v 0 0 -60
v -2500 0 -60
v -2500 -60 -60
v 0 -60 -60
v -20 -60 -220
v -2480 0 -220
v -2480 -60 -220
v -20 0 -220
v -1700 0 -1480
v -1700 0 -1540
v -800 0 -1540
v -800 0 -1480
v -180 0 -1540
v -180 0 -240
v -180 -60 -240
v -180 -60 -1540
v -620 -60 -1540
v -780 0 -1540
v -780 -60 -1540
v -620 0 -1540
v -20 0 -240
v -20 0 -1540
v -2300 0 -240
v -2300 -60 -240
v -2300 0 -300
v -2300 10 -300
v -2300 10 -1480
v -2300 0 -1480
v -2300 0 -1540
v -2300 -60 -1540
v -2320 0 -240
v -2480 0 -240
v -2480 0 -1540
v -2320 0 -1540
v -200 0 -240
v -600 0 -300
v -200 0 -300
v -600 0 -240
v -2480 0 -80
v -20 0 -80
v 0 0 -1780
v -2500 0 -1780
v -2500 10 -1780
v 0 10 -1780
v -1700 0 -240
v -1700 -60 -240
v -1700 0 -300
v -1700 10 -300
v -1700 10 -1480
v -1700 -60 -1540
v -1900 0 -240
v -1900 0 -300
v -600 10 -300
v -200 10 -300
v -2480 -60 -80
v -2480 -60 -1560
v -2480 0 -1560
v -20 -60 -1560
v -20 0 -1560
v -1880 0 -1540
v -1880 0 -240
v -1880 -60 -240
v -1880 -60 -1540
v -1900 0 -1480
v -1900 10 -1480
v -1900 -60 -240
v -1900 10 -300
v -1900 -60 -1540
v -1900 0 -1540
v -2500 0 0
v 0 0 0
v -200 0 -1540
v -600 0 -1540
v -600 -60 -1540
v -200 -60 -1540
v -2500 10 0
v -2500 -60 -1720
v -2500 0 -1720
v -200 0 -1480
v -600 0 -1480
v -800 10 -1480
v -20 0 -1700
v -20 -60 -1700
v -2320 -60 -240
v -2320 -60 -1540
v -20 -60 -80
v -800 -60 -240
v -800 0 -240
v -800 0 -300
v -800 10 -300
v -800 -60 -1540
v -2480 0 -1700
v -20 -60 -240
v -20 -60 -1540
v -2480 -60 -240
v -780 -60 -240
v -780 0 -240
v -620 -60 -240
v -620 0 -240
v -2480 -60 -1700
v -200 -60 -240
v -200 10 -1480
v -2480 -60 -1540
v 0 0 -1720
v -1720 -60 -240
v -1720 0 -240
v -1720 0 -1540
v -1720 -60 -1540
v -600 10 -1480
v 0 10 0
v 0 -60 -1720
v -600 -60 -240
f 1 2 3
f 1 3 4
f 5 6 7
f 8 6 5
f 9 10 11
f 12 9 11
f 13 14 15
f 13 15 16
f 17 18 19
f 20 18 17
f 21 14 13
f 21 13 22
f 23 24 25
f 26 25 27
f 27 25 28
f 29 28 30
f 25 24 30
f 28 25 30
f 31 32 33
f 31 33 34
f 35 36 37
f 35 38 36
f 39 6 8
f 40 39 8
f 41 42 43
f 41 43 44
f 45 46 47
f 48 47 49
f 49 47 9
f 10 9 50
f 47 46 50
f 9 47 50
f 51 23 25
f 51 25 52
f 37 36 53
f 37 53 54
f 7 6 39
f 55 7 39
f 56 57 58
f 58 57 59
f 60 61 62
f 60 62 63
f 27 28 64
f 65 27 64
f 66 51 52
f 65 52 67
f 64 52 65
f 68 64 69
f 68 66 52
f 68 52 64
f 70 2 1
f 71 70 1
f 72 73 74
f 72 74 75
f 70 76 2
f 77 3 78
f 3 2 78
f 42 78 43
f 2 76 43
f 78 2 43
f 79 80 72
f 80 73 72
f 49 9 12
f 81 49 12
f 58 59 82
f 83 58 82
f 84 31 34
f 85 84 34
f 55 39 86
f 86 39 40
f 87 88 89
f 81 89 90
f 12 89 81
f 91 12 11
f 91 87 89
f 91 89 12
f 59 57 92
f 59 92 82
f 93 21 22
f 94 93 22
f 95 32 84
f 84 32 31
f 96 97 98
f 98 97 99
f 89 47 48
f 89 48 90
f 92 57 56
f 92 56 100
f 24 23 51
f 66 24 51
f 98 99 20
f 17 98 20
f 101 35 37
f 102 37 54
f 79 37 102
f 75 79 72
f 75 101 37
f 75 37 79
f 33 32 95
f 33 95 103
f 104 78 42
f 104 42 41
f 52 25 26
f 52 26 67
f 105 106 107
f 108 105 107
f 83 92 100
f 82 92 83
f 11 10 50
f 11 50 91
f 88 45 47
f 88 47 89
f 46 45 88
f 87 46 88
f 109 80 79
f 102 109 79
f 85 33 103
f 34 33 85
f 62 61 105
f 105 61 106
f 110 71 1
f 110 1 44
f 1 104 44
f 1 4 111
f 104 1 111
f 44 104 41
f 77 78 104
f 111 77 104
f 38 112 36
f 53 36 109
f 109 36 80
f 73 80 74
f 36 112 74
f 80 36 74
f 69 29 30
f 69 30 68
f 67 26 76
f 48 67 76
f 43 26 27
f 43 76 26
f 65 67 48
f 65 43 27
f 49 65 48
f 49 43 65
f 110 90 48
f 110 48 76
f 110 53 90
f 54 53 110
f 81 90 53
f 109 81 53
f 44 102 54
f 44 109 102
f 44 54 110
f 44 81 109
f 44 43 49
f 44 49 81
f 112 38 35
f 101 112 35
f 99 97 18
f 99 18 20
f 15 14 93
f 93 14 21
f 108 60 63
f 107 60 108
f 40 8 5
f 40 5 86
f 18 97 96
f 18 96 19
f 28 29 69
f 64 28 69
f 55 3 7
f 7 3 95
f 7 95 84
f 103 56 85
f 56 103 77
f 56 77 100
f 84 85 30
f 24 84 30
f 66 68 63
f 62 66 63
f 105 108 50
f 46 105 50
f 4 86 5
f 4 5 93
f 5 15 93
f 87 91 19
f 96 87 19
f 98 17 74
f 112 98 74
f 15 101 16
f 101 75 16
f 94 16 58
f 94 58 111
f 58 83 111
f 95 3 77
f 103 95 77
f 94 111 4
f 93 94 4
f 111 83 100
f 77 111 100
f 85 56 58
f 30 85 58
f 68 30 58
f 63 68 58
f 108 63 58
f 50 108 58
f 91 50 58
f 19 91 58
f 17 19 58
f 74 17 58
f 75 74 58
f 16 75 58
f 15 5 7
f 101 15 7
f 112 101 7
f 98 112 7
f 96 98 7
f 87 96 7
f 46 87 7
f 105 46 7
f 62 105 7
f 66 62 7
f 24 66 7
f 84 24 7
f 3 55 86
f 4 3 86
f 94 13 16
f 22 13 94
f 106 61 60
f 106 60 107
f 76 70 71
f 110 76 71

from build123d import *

# Parameters (mm, degrees)
SKETCH1_W      = 2500
SKETCH1_H      = 300
EXTRUDE1_DEPTH = 10
SKETCH2_W      = 2500
SKETCH2_H      = 20
EXTRUDE2_DEPTH = 60
SKETCH3_W      = 200
SKETCH3_H      = 590
EXTRUDE3_DEPTH = 10
SKETCH5_W      = 20
SKETCH5_H      = 810
SKETCH5_H_2    = 650
EXTRUDE7_DEPTH = 60


with BuildPart() as part:
    # Sketch1 → Extrude1 (new body)
    with BuildSketch(Plane(origin=(0, 0, 0), x_dir=(1, 0, 0), z_dir=(0, 1, 0))):
        with Locations((-1250, 150)):
            Rectangle(SKETCH1_W, SKETCH1_H)
    extrude(amount=EXTRUDE1_DEPTH)

    # Sketch2 → Extrude2 (add)
    with BuildSketch(Plane.XZ):
        with Locations((-1250, -70)):
            Rectangle(SKETCH2_W, SKETCH2_H)
        with Locations((-1250, -230)):
            Rectangle(SKETCH2_W, SKETCH2_H)
    extrude(amount=EXTRUDE2_DEPTH)

    # Sketch3 → Extrude3 (add)
    with BuildSketch(Plane.XZ):
        with Locations((-100, -595)):
            Rectangle(SKETCH3_W, SKETCH3_H)
        with Locations((-700, -595)):
            Rectangle(SKETCH3_W, SKETCH3_H)
        with Locations((-1800, -595)):
            Rectangle(SKETCH3_W, SKETCH3_H)
        with Locations((-2400, -595)):
            Rectangle(SKETCH3_W, SKETCH3_H)
    extrude(amount=-EXTRUDE3_DEPTH)

    # Sketch5 → Extrude7 (add)
    with BuildSketch(Plane.XZ):
        with Locations((-2490, -485)):
            Rectangle(SKETCH5_W, SKETCH5_H)
        with Locations((-2310, -565)):
            Rectangle(SKETCH5_W, SKETCH5_H_2)
        with Locations((-1890, -565)):
            Rectangle(SKETCH5_W, SKETCH5_H_2)
        with Locations((-1710, -565)):
            Rectangle(SKETCH5_W, SKETCH5_H_2)
        with Locations((-790, -565)):
            Rectangle(SKETCH5_W, SKETCH5_H_2)
        with Locations((-610, -565)):
            Rectangle(SKETCH5_W, SKETCH5_H_2)
        with Locations((-190, -565)):
            Rectangle(SKETCH5_W, SKETCH5_H_2)
        with Locations((-10, -485)):
            Rectangle(SKETCH5_W, SKETCH5_H)
    extrude(amount=EXTRUDE7_DEPTH)

    # Mirror2: part across face


with BuildPart() as part_1:
    add(part.part)
    add(part.part.mirror(Plane(origin=(-700, -14.090909091, -890), x_dir=(1, 0, 0), z_dir=(0, 0, -1))))


solid = part_1.part
